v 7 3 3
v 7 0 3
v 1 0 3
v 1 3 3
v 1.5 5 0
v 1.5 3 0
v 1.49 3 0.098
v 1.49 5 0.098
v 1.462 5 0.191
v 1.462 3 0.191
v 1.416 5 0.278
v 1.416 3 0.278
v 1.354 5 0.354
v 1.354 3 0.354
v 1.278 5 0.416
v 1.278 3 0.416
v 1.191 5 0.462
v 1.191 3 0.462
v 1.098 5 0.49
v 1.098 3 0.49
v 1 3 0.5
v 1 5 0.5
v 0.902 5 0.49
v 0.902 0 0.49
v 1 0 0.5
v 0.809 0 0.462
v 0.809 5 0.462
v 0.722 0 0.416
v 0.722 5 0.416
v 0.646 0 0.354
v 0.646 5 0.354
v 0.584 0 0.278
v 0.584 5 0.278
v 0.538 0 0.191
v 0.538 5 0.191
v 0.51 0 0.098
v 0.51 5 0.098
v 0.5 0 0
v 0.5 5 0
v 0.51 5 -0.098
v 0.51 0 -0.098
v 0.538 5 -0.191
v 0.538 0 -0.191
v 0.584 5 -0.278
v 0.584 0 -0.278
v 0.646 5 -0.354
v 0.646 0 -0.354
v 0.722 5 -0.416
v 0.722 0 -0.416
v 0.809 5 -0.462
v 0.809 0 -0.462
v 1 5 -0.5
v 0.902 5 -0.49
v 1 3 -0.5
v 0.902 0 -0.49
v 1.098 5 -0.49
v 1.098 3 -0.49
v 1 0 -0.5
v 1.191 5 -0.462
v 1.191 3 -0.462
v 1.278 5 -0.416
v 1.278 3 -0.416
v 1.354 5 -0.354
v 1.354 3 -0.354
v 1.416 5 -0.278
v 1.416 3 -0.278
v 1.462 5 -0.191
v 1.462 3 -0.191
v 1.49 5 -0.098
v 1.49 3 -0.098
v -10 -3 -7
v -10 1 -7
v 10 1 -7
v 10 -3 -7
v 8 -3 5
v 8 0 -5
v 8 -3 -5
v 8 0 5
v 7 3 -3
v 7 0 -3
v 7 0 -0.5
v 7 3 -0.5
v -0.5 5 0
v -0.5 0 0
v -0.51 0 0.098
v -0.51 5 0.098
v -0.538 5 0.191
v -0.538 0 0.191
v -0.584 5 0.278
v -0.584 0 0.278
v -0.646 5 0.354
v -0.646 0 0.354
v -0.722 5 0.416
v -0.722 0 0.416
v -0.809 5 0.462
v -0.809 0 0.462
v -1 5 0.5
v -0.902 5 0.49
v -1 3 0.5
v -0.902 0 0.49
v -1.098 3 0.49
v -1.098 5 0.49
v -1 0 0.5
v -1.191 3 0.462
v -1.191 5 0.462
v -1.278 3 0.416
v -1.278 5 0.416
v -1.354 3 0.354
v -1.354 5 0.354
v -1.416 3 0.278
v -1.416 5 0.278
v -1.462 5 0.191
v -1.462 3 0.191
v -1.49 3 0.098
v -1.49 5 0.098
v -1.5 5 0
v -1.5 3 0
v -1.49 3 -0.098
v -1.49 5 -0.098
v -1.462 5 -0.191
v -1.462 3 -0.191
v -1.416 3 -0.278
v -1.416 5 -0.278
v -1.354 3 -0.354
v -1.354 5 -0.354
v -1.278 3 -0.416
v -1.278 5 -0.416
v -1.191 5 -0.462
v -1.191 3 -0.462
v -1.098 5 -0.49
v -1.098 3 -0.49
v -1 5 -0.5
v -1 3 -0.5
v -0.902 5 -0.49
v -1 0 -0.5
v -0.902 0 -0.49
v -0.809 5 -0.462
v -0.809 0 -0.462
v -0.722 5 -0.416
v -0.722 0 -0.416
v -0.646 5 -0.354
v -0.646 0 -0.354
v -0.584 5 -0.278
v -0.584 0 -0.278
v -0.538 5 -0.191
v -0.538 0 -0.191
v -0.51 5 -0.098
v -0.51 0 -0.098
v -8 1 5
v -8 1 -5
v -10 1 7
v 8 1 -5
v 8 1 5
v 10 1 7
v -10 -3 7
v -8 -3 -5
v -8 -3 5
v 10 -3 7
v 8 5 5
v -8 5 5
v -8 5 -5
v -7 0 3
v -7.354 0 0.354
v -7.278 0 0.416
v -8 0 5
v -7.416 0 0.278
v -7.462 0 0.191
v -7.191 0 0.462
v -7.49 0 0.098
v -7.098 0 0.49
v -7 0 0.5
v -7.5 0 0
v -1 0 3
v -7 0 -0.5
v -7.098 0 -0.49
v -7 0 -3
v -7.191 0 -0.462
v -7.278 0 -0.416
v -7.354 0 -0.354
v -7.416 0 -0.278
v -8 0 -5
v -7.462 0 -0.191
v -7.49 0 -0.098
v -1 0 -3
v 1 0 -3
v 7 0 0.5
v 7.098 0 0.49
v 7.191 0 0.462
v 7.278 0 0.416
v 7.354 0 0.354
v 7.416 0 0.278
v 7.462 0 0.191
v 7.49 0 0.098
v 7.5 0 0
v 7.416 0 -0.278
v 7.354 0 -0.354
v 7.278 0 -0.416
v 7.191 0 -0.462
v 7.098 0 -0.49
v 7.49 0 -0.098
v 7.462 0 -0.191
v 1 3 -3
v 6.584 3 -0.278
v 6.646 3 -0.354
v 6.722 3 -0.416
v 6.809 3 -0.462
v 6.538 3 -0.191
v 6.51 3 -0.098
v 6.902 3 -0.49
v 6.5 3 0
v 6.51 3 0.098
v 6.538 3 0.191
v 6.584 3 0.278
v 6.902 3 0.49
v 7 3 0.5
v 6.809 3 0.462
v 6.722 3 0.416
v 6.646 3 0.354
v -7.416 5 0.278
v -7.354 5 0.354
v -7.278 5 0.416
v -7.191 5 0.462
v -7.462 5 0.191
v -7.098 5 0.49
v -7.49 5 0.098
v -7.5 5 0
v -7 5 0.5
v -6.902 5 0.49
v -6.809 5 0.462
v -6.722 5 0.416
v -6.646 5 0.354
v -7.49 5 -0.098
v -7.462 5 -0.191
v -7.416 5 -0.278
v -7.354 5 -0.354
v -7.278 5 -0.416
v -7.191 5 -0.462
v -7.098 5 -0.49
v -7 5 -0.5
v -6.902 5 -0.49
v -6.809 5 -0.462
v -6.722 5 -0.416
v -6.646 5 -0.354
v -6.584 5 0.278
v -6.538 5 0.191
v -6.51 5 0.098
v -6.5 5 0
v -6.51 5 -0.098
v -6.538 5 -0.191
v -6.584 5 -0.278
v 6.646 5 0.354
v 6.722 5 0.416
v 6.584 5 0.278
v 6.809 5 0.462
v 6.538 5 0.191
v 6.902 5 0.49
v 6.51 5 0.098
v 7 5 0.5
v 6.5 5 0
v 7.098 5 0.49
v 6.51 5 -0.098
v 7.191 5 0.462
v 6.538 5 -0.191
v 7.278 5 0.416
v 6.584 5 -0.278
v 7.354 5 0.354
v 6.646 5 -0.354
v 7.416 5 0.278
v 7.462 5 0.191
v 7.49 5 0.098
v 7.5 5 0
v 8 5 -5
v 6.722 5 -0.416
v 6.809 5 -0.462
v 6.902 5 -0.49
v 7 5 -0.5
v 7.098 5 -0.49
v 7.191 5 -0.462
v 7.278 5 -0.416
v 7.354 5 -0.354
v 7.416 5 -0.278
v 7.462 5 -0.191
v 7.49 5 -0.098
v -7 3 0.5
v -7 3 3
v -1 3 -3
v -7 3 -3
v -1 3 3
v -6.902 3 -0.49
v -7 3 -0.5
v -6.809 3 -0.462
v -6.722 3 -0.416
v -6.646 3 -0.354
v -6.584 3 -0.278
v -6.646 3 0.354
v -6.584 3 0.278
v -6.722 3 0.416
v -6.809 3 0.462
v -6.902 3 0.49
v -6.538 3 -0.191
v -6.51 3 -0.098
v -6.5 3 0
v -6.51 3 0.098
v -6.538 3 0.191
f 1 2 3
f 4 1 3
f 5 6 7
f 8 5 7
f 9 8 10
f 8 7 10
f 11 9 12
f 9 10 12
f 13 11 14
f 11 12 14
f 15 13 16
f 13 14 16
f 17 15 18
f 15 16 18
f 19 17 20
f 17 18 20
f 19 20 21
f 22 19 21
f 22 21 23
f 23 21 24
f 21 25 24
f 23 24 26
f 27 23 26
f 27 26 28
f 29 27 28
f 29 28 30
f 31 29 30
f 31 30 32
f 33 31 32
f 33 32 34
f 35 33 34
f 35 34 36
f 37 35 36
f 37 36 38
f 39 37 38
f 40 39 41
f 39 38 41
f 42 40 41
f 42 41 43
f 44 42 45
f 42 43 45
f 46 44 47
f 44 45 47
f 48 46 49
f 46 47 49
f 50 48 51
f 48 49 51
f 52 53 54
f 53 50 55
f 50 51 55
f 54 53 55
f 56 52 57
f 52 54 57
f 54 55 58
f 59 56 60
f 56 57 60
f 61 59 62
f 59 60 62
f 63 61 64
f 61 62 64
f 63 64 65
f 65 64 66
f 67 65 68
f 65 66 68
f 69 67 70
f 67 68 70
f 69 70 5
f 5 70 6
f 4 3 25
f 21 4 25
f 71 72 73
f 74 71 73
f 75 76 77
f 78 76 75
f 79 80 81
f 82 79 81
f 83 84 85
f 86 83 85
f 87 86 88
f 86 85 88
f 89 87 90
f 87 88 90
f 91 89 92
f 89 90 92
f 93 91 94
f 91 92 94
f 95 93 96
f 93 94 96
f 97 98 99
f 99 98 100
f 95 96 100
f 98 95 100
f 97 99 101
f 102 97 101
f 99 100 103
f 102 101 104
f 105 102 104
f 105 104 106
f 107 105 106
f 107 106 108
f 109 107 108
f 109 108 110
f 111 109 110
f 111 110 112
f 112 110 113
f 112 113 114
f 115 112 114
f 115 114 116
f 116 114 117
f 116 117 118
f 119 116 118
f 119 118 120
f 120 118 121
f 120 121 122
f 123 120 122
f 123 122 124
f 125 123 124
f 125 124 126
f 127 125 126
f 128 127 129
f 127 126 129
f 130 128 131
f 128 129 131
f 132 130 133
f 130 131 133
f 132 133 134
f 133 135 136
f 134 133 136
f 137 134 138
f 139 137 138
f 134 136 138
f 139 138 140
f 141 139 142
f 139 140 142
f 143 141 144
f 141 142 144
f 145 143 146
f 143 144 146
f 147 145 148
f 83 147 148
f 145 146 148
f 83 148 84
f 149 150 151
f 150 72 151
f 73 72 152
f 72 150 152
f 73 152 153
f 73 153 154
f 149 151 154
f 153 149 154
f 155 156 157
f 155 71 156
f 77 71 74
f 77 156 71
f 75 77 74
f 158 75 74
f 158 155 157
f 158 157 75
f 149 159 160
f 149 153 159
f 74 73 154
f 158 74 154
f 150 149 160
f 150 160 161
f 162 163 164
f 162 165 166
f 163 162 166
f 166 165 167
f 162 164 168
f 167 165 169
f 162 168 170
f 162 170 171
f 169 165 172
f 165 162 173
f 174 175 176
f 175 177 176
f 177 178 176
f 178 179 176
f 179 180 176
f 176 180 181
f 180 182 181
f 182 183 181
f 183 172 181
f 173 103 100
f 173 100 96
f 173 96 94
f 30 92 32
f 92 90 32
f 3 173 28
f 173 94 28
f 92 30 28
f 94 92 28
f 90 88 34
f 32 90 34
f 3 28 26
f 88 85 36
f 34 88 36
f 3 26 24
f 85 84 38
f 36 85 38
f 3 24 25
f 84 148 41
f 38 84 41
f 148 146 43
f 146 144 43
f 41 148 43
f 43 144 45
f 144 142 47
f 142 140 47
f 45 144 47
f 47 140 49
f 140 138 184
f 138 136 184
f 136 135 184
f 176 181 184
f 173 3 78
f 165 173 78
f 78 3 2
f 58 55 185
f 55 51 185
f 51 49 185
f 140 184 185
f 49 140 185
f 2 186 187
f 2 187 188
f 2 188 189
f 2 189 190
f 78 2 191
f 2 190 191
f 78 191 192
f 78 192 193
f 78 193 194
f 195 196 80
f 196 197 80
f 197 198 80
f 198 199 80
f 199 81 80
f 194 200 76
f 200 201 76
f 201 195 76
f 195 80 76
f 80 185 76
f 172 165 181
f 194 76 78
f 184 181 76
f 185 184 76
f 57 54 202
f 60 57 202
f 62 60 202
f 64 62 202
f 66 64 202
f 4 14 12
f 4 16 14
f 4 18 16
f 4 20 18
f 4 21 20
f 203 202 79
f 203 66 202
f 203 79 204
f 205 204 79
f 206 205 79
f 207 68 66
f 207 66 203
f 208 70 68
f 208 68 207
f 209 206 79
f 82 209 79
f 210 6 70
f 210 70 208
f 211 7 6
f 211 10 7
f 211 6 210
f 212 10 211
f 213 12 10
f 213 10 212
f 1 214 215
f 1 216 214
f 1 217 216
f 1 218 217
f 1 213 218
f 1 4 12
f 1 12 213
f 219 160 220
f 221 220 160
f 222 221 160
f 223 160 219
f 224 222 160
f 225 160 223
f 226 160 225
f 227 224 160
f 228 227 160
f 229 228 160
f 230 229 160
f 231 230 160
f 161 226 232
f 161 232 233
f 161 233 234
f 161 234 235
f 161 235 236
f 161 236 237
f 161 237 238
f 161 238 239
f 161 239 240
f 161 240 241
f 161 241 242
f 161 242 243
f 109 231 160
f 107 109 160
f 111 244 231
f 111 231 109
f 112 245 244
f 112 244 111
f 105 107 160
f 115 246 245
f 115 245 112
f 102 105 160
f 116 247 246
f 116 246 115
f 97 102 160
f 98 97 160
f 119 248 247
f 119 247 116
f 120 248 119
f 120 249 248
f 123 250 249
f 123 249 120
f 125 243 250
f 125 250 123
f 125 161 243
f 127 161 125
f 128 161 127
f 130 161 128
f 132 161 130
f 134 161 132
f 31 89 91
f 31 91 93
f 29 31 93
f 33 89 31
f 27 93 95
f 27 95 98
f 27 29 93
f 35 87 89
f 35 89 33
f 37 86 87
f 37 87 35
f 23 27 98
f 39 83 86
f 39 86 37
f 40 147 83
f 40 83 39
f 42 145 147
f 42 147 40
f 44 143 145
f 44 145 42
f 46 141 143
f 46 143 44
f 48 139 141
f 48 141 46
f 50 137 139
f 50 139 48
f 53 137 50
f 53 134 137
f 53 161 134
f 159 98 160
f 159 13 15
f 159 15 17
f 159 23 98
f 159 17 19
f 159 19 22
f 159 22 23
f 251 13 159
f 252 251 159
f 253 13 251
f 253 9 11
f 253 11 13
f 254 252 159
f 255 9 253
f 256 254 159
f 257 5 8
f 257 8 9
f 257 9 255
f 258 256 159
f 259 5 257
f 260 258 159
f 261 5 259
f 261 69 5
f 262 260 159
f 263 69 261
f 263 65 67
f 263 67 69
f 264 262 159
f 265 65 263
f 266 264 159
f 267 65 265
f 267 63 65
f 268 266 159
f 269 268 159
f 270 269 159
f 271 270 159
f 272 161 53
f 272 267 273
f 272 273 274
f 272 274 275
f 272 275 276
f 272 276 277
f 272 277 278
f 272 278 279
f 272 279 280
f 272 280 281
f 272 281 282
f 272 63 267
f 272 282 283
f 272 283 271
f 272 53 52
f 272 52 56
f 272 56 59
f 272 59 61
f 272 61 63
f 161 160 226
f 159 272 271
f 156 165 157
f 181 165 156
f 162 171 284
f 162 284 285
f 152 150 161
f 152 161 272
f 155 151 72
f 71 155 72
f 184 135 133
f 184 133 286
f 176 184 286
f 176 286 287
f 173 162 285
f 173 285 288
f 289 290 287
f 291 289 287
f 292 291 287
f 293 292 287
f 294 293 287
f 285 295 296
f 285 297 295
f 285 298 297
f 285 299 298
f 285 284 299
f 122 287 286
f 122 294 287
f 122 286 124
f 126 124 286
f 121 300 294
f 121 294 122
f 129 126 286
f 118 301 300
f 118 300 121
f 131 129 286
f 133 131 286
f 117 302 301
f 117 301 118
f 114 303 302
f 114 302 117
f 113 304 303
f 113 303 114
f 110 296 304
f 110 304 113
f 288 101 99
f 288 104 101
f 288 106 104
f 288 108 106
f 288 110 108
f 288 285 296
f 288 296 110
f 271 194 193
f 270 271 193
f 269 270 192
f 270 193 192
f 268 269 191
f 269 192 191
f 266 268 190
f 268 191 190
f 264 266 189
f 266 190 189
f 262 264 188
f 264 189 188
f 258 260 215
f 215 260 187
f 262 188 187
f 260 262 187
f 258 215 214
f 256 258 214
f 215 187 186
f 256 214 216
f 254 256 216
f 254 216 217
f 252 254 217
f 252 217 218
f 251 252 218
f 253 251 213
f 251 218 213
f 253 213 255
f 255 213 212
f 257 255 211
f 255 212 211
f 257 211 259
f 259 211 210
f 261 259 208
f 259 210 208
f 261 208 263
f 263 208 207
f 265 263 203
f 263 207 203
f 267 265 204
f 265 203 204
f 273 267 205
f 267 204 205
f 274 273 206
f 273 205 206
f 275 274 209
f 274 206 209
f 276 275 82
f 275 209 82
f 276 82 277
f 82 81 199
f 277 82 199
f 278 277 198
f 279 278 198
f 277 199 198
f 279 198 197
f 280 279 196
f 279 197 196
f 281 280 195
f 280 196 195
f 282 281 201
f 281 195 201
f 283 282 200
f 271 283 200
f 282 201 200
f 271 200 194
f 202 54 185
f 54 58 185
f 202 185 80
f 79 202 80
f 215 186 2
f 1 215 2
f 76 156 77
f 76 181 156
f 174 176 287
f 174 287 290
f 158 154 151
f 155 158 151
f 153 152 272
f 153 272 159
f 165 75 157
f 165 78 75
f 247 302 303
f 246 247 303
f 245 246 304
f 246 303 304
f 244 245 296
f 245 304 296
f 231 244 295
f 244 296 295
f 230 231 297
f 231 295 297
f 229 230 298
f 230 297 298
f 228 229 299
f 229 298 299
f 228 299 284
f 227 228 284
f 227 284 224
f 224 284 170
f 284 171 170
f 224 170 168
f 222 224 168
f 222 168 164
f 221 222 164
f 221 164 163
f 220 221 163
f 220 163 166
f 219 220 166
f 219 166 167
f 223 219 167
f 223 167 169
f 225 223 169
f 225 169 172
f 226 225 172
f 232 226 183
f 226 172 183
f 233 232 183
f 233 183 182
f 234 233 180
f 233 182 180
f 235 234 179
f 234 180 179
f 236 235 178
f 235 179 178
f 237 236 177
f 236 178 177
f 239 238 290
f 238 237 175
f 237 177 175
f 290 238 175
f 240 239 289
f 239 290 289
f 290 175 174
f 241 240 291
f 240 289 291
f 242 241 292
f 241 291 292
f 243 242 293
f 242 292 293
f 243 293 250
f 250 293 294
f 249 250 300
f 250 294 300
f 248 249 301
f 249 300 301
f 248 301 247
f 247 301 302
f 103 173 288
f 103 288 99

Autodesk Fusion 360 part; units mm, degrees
sketch "Sketch1" plane through (0, 0, 0) normal (0, 1, 0) x (1, 0, 0)
  line L0 (7, -3.5) -> (-7, -3.5)
  line L1 (-7, -3.5) -> (-7, 3.5)
  line L2 (-7, 3.5) -> (7, 3.5)
  line L3 (7, 3.5) -> (7, -3.5)
  line L4 (7, -3.5) -> (-7, 3.5) construction
  line L5 (-7, -3.5) -> (7, 3.5) construction
  circle A0 centre (-6, 0) radius 0.5
  circle A1 centre (-1, 0) radius 0.5
  circle A2 centre (1, 0) radius 0.5
  circle A3 centre (6, 0) radius 0.5
  dimension "d3" = 14
  dimension "d4" = 7
  dimension "d7" = 1
  dimension "d8" = 1
  dimension "d9" = 1
  dimension "d10" = 1
sketch "Sketch2" plane through (0, 0, 0) normal (0, -1, 0) x (1, 0, 0)
  circle A0 centre (-1, 0) radius 0.5
  circle A1 centre (1, 0) radius 0.5
  circle A2 centre (6, 0) radius 0.5
  circle A3 centre (-6, 0) radius 0.5
  line L0 (-7, -3.5) -> (7, -3.5)
  line L1 (7, -3.5) -> (7, 3.5)
  line L2 (7, 3.5) -> (-7, 3.5)
  line L3 (-7, 3.5) -> (-7, -3.5)
  line L4 (-6, 2.5) -> (-6, -2.5)
  line L5 (6, -2.5) -> (6, 2.5)
  line L6 (6, -2.5) -> (1, -2.5)
  line L7 (1, -2.5) -> (1, 2.5)
  line L8 (1, 2.5) -> (6, 2.5)
  line L9 (-6, -2.5) -> (-6, 2.5)
  line L10 (-6, 2.5) -> (-1, 2.5)
  line L11 (-1, 2.5) -> (-1, -2.5)
  line L12 (-1, -2.5) -> (-6, -2.5)
sketch "Sketch3" plane through (0, 0, 0) normal (0, -1, 0) x (1, 0, 0)
sketch "Sketch4" plane through (0, 0, 0) normal (0, 1, 0) x (1, 0, 0)
  line L0 (-8, -5) -> (8, -5)
  line L1 (8, -5) -> (8, 5)
  line L2 (8, 5) -> (-8, 5)
  line L3 (-8, 5) -> (-8, -5)
  line L4 (-8, -5) -> (8, 5) construction
  line L5 (8, -5) -> (-8, 5) construction
  line L6 (-1, 0) -> (-1, -3)
  line L7 (-1, -3) -> (-7, -3)
  line L8 (-7, -3) -> (-7, 3)
  line L9 (-7, 3) -> (-1, 3)
  line L10 (-1, 3) -> (-1, 0)
  line L11 (1, 3) -> (1, -3)
  line L12 (1, -3) -> (7, -3)
  line L13 (7, -3) -> (7, 3)
  line L14 (7, 3) -> (1, 3)
  dimension "d16" = 16
  dimension "d17" = 10
sketch "Sketch5" plane through (0, 0, 0) normal (0, -1, 0) x (1, 0, 0)
  line L0 (-8, 5) -> (-8, -5)
  line L1 (-8, -5) -> (8, -5)
  line L2 (8, -5) -> (8, 5)
  line L3 (8, 5) -> (-8, 5)
  line L4 (-1, -3) -> (-1, 3)
  line L5 (-1, 3) -> (-7, 3)
  line L6 (-7, 3) -> (-7, -3)
  line L7 (-7, -3) -> (-1, -3)
  line L8 (1, -3) -> (1, 3)
  line L9 (1, 3) -> (7, 3)
  line L10 (7, 3) -> (7, -3)
  line L11 (7, -3) -> (1, -3)
sketch "Sketch6" plane through (0, 0, 0) normal (0, -1, 0) x (1, 0, 0)
  line L0 (-1, 3) -> (-1, -3)
  line L1 (-1, -3) -> (-7, -3)
  line L2 (-7, -3) -> (-7, 3)
  line L3 (-7, 3) -> (-1, 3)
  line L4 (1, 3) -> (7, 3)
  line L5 (7, 3) -> (7, -3)
  line L6 (7, -3) -> (1, -3)
  line L7 (1, -3) -> (1, 3)
  line L8 (-8, 5) -> (-8, -5)
  line L9 (-8, -5) -> (8, -5)
  line L10 (8, -5) -> (8, 5)
  line L11 (8, 5) -> (-8, 5)
  circle A0 centre (-7, 0) radius 0.25
  circle A1 centre (-1, 0) radius 0.25
  circle A2 centre (1, 0) radius 0.25
  circle A3 centre (7, 0) radius 0.25
  dimension "d23" = 0.5
  dimension "d24" = 0.5
  dimension "d25" = 0.5
  dimension "d26" = 0.5
sketch "Sketch7" plane through (0, 4, 0) normal (0, 1, 0) x (-1, 0, 0)
  circle A0 centre (1, 0) radius 0.25
  circle A1 centre (-1, 0) radius 0.25
  circle A2 centre (7, 0) radius 0.25
  circle A3 centre (-7, 0) radius 0.25
  line L0 (8, -5) -> (8, 5)
  line L1 (8, 5) -> (-8, 5)
  line L2 (-8, 5) -> (-8, -5)
  line L3 (-8, -5) -> (8, -5)
  line L4 (-10, -7) -> (10, -7)
  line L5 (10, -7) -> (10, 7)
  line L6 (10, 7) -> (-10, 7)
  line L7 (-10, 7) -> (-10, -7)
  circle A4 centre (-7, 0) radius 0.25
  circle A5 centre (-1, 0) radius 0.25
  circle A6 centre (1, 0) radius 0.25
  circle A7 centre (7, 0) radius 0.25
  dimension "d29" = 2
sketch "Sketch8" plane through (0, 0, 0) normal (0, -1, 0) x (1, 0, 0)
  line L0 (-8, 5) -> (-8, -5)
  line L1 (-8, -5) -> (8, -5)
  line L2 (8, -5) -> (8, 5)
  line L3 (8, 5) -> (-8, 5)
  arc A0 (1, 0.25) -> (1, -0.25) centre (1, 0) ccw
  line L4 (1, 0.25) -> (1, 3)
  line L5 (1, 3) -> (7, 3)
  line L6 (7, 3) -> (7, 0.25)
  arc A1 (7, -0.25) -> (7, 0.25) centre (7, 0) ccw
  line L7 (7, -0.25) -> (7, -3)
  line L8 (7, -3) -> (1, -3)
  line L9 (1, -3) -> (1, -0.25)
  arc A2 (-1, -0.25) -> (-1, 0.25) centre (-1, 0) ccw
  line L10 (-1, -0.25) -> (-1, -3)
  line L11 (-1, -3) -> (-7, -3)
  line L12 (-7, -3) -> (-7, -0.25)
  arc A3 (-7, 0.25) -> (-7, -0.25) centre (-7, 0) ccw
  line L13 (-7, 0.25) -> (-7, 3)
  line L14 (-7, 3) -> (-1, 3)
  line L15 (-1, 3) -> (-1, 0.25)
  circle A4 centre (-6.5, 4) radius 0.5
  circle A5 centre (-6.5, -4) radius 0.5
  circle A6 centre (6.5, -4) radius 0.5
  circle A7 centre (6.5, 4) radius 0.5
ref_plane "WorkPlane1" through (0, -6, 0) normal (0, -1, 0) x (-1, 0, 0)
sketch "Sketch11" plane through (0, 0, 0) normal (0, -1, 0) x (1, 0, 0)
sketch "Sketch12" plane through (0, 4, 0) normal (0, 1, 0) x (-1, 0, 0)
  circle A0 centre (1, 0) radius 0.25
  circle A1 centre (-1, 0) radius 0.25
  circle A2 centre (7, 0) radius 0.25
  circle A3 centre (-7, 0) radius 0.25
  line L0 (-11, -8) -> (11, -8)
  line L1 (11, -8) -> (11, 8)
  line L2 (11, 8) -> (-11, 8)
  line L3 (-11, 8) -> (-11, -8)
sketch "Sketch13" plane through (0, 0, 0) normal (0, -1, 0) x (1, 0, 0)
sketch "Sketch14" plane through (0, 0, 0) normal (0, -1, 0) x (1, 0, 0)
sketch "Sketch15" plane through (0, 0, 0) normal (0, 1, 0) x (1, 0, 0)
  line L0 (8, -5) -> (-8, -5)
  line L1 (-8, -5) -> (-8, 5)
  line L2 (-8, 5) -> (8, 5)
  line L3 (8, 5) -> (8, -5)
  line L4 (8, -5) -> (-8, 5) construction
  line L5 (-8, -5) -> (8, 5) construction
  dimension "d43" = 16
  dimension "d44" = 10
extrude "Extrude9" add sketch "Sketch15" along normal blind 5
sketch "Sketch16" plane through (0, 0, 0) normal (0, -1, 0) x (1, 0, 0)
  line L0 (-8, -5) -> (8, -5)
  line L1 (8, -5) -> (8, 5)
  line L2 (8, 5) -> (-8, 5)
  line L3 (-8, 5) -> (-8, -5)
  line L4 (7, 3) -> (1, 3)
  line L5 (1, 3) -> (1, -3)
  line L6 (1, -3) -> (7, -3)
  line L7 (7, -3) -> (7, 3)
  line L8 (7, 3) -> (1, -3) construction
  line L9 (1, 3) -> (7, -3) construction
  line L10 (-1, 0) -> (-4, 0)
  line L11 (-1, 0) -> (-1, 3)
  line L12 (-1, 0) -> (-1, -3)
  line L13 (-1, -3) -> (-7, -3)
  line L14 (-7, -3) -> (-7, 3)
  line L15 (-7, 3) -> (-1, 3)
  point P0 (4, 0)
  dimension "d48" = 6
  dimension "d49" = 6
  dimension "d50" = 1
  dimension "d51" = 3
  dimension "d52" = 3
  dimension "d53" = 6
  dimension "d54" = 6
extrude "Extrude10" cut sketch "Sketch16" against normal blind 3 contours L4 L5 L6 L7 | L11 L12 L13 L14 L15
sketch "Sketch17" plane through (0, 0, 0) normal (0, -1, 0) x (1, 0, 0)
  line L0 (-7, 3) -> (-1, 3)
  line L1 (-1, 3) -> (-1, -3)
  line L2 (-1, -3) -> (-7, -3)
  line L3 (-7, -3) -> (-7, 3)
  line L4 (1, 3) -> (7, 3)
  line L5 (7, 3) -> (7, -3)
  line L6 (7, -3) -> (1, -3)
  line L7 (1, -3) -> (1, 3)
  line L8 (-8, -5) -> (8, -5)
  line L9 (8, -5) -> (8, 5)
  line L10 (8, 5) -> (-8, 5)
  line L11 (-8, 5) -> (-8, -5)
  line L12 (-10, -7) -> (10, -7)
  line L13 (10, -7) -> (10, 7)
  line L14 (10, 7) -> (-10, 7)
  line L15 (-10, 7) -> (-10, -7)
  dimension "d57" = 2
extrude "Extrude11" add sketch "Sketch17" along normal blind 3 and the other way blind 1 contours L12 L13 L14 L15
sketch "Sketch18" plane through (0, 0, 0) normal (0, -1, 0) x (1, 0, 0)
  line L0 (-7, 3) -> (-1, 3)
  line L1 (-1, 3) -> (-1, -3)
  line L2 (-1, -3) -> (-7, -3)
  line L3 (-7, -3) -> (-7, 3)
  line L4 (1, 3) -> (7, 3)
  line L5 (7, 3) -> (7, -3)
  line L6 (7, -3) -> (1, -3)
  line L7 (1, -3) -> (1, 3)
  line L8 (-8, -5) -> (8, -5)
  line L9 (8, -5) -> (8, 5)
  line L10 (8, 5) -> (-8, 5)
  line L11 (-8, 5) -> (-8, -5)
  circle A0 centre (1, 0) radius 0.5
  circle A1 centre (7, 0) radius 0.5
  circle A2 centre (-1, 0) radius 0.5
  circle A3 centre (-7, 0) radius 0.5
  dimension "d62" = 1
  dimension "d63" = 1
  dimension "d64" = 1
  dimension "d65" = 1
extrude "Extrude12" cut sketch "Sketch18" against normal blind 5 contours L3 A3 | L3 A3 | L1 A2 | L1 A2 | L7 A0 | L7 A0 | L5 A1 | L5 A1
sketch "Sketch19" plane through (0, 0, 0) normal (0, -1, 0) x (1, 0, 0)
  line L0 (-8, -5) -> (8, -5)
  line L1 (8, 5) -> (-8, 5)
  line L2 (-8, 5) -> (-8, -5)
  arc A0 (1, 0.5) -> (1, -0.5) centre (1, 0) ccw
  arc A1 (7, -0.5) -> (7, 0.5) centre (7, 0) ccw
  line L3 (7, -3) -> (1, -3)
  line L4 (1, -3) -> (1, -0.5)
  arc A2 (-1, -0.5) -> (-1, 0.5) centre (-1, 0) ccw
  line L5 (-1, -0.5) -> (-1, -3)
  line L6 (-1, -3) -> (-7, -3)
  line L7 (-7, -3) -> (-7, -0.5)
  arc A3 (-7, 0.5) -> (-7, -0.5) centre (-7, 0) ccw
  line L8 (-7, 0.5) -> (-7, 3)
  line L9 (-7, 3) -> (-1, 3)
  line L10 (-8, 5) -> (8, 5)
  line L11 (8, 5) -> (8, -5)
  line L12 (8, -5) -> (-8, -5)
  line L13 (-8, -5) -> (-8, 5)
sketch "Sketch20" plane through (0, -10, 0) normal (0, 1, 0) x (-1, 0, 0)
  line L0 (-8, -5) -> (8, -5)
  line L1 (8, -5) -> (8, 5)
  line L2 (8, 5) -> (-8, 5)
  line L3 (-8, 5) -> (-8, -5)
  line L4 (-7, -4) -> (7, -4)
  line L5 (7, -4) -> (7, 4)
  line L6 (7, 4) -> (-7, 4)
  line L7 (-7, 4) -> (-7, -4)
  dimension "d73" = -1
sketch "Sketch21" plane through (0, -13, 0) normal (0, -1, 0) x (1, 0, 0)
  line L0 (-8, -5) -> (8, -5)
  line L1 (8, -5) -> (8, 5)
  line L2 (8, 5) -> (-8, 5)
  line L3 (-8, 5) -> (-8, -5)
  circle A0 centre (-4, 0) radius 2
  circle A1 centre (4, 0) radius 2
